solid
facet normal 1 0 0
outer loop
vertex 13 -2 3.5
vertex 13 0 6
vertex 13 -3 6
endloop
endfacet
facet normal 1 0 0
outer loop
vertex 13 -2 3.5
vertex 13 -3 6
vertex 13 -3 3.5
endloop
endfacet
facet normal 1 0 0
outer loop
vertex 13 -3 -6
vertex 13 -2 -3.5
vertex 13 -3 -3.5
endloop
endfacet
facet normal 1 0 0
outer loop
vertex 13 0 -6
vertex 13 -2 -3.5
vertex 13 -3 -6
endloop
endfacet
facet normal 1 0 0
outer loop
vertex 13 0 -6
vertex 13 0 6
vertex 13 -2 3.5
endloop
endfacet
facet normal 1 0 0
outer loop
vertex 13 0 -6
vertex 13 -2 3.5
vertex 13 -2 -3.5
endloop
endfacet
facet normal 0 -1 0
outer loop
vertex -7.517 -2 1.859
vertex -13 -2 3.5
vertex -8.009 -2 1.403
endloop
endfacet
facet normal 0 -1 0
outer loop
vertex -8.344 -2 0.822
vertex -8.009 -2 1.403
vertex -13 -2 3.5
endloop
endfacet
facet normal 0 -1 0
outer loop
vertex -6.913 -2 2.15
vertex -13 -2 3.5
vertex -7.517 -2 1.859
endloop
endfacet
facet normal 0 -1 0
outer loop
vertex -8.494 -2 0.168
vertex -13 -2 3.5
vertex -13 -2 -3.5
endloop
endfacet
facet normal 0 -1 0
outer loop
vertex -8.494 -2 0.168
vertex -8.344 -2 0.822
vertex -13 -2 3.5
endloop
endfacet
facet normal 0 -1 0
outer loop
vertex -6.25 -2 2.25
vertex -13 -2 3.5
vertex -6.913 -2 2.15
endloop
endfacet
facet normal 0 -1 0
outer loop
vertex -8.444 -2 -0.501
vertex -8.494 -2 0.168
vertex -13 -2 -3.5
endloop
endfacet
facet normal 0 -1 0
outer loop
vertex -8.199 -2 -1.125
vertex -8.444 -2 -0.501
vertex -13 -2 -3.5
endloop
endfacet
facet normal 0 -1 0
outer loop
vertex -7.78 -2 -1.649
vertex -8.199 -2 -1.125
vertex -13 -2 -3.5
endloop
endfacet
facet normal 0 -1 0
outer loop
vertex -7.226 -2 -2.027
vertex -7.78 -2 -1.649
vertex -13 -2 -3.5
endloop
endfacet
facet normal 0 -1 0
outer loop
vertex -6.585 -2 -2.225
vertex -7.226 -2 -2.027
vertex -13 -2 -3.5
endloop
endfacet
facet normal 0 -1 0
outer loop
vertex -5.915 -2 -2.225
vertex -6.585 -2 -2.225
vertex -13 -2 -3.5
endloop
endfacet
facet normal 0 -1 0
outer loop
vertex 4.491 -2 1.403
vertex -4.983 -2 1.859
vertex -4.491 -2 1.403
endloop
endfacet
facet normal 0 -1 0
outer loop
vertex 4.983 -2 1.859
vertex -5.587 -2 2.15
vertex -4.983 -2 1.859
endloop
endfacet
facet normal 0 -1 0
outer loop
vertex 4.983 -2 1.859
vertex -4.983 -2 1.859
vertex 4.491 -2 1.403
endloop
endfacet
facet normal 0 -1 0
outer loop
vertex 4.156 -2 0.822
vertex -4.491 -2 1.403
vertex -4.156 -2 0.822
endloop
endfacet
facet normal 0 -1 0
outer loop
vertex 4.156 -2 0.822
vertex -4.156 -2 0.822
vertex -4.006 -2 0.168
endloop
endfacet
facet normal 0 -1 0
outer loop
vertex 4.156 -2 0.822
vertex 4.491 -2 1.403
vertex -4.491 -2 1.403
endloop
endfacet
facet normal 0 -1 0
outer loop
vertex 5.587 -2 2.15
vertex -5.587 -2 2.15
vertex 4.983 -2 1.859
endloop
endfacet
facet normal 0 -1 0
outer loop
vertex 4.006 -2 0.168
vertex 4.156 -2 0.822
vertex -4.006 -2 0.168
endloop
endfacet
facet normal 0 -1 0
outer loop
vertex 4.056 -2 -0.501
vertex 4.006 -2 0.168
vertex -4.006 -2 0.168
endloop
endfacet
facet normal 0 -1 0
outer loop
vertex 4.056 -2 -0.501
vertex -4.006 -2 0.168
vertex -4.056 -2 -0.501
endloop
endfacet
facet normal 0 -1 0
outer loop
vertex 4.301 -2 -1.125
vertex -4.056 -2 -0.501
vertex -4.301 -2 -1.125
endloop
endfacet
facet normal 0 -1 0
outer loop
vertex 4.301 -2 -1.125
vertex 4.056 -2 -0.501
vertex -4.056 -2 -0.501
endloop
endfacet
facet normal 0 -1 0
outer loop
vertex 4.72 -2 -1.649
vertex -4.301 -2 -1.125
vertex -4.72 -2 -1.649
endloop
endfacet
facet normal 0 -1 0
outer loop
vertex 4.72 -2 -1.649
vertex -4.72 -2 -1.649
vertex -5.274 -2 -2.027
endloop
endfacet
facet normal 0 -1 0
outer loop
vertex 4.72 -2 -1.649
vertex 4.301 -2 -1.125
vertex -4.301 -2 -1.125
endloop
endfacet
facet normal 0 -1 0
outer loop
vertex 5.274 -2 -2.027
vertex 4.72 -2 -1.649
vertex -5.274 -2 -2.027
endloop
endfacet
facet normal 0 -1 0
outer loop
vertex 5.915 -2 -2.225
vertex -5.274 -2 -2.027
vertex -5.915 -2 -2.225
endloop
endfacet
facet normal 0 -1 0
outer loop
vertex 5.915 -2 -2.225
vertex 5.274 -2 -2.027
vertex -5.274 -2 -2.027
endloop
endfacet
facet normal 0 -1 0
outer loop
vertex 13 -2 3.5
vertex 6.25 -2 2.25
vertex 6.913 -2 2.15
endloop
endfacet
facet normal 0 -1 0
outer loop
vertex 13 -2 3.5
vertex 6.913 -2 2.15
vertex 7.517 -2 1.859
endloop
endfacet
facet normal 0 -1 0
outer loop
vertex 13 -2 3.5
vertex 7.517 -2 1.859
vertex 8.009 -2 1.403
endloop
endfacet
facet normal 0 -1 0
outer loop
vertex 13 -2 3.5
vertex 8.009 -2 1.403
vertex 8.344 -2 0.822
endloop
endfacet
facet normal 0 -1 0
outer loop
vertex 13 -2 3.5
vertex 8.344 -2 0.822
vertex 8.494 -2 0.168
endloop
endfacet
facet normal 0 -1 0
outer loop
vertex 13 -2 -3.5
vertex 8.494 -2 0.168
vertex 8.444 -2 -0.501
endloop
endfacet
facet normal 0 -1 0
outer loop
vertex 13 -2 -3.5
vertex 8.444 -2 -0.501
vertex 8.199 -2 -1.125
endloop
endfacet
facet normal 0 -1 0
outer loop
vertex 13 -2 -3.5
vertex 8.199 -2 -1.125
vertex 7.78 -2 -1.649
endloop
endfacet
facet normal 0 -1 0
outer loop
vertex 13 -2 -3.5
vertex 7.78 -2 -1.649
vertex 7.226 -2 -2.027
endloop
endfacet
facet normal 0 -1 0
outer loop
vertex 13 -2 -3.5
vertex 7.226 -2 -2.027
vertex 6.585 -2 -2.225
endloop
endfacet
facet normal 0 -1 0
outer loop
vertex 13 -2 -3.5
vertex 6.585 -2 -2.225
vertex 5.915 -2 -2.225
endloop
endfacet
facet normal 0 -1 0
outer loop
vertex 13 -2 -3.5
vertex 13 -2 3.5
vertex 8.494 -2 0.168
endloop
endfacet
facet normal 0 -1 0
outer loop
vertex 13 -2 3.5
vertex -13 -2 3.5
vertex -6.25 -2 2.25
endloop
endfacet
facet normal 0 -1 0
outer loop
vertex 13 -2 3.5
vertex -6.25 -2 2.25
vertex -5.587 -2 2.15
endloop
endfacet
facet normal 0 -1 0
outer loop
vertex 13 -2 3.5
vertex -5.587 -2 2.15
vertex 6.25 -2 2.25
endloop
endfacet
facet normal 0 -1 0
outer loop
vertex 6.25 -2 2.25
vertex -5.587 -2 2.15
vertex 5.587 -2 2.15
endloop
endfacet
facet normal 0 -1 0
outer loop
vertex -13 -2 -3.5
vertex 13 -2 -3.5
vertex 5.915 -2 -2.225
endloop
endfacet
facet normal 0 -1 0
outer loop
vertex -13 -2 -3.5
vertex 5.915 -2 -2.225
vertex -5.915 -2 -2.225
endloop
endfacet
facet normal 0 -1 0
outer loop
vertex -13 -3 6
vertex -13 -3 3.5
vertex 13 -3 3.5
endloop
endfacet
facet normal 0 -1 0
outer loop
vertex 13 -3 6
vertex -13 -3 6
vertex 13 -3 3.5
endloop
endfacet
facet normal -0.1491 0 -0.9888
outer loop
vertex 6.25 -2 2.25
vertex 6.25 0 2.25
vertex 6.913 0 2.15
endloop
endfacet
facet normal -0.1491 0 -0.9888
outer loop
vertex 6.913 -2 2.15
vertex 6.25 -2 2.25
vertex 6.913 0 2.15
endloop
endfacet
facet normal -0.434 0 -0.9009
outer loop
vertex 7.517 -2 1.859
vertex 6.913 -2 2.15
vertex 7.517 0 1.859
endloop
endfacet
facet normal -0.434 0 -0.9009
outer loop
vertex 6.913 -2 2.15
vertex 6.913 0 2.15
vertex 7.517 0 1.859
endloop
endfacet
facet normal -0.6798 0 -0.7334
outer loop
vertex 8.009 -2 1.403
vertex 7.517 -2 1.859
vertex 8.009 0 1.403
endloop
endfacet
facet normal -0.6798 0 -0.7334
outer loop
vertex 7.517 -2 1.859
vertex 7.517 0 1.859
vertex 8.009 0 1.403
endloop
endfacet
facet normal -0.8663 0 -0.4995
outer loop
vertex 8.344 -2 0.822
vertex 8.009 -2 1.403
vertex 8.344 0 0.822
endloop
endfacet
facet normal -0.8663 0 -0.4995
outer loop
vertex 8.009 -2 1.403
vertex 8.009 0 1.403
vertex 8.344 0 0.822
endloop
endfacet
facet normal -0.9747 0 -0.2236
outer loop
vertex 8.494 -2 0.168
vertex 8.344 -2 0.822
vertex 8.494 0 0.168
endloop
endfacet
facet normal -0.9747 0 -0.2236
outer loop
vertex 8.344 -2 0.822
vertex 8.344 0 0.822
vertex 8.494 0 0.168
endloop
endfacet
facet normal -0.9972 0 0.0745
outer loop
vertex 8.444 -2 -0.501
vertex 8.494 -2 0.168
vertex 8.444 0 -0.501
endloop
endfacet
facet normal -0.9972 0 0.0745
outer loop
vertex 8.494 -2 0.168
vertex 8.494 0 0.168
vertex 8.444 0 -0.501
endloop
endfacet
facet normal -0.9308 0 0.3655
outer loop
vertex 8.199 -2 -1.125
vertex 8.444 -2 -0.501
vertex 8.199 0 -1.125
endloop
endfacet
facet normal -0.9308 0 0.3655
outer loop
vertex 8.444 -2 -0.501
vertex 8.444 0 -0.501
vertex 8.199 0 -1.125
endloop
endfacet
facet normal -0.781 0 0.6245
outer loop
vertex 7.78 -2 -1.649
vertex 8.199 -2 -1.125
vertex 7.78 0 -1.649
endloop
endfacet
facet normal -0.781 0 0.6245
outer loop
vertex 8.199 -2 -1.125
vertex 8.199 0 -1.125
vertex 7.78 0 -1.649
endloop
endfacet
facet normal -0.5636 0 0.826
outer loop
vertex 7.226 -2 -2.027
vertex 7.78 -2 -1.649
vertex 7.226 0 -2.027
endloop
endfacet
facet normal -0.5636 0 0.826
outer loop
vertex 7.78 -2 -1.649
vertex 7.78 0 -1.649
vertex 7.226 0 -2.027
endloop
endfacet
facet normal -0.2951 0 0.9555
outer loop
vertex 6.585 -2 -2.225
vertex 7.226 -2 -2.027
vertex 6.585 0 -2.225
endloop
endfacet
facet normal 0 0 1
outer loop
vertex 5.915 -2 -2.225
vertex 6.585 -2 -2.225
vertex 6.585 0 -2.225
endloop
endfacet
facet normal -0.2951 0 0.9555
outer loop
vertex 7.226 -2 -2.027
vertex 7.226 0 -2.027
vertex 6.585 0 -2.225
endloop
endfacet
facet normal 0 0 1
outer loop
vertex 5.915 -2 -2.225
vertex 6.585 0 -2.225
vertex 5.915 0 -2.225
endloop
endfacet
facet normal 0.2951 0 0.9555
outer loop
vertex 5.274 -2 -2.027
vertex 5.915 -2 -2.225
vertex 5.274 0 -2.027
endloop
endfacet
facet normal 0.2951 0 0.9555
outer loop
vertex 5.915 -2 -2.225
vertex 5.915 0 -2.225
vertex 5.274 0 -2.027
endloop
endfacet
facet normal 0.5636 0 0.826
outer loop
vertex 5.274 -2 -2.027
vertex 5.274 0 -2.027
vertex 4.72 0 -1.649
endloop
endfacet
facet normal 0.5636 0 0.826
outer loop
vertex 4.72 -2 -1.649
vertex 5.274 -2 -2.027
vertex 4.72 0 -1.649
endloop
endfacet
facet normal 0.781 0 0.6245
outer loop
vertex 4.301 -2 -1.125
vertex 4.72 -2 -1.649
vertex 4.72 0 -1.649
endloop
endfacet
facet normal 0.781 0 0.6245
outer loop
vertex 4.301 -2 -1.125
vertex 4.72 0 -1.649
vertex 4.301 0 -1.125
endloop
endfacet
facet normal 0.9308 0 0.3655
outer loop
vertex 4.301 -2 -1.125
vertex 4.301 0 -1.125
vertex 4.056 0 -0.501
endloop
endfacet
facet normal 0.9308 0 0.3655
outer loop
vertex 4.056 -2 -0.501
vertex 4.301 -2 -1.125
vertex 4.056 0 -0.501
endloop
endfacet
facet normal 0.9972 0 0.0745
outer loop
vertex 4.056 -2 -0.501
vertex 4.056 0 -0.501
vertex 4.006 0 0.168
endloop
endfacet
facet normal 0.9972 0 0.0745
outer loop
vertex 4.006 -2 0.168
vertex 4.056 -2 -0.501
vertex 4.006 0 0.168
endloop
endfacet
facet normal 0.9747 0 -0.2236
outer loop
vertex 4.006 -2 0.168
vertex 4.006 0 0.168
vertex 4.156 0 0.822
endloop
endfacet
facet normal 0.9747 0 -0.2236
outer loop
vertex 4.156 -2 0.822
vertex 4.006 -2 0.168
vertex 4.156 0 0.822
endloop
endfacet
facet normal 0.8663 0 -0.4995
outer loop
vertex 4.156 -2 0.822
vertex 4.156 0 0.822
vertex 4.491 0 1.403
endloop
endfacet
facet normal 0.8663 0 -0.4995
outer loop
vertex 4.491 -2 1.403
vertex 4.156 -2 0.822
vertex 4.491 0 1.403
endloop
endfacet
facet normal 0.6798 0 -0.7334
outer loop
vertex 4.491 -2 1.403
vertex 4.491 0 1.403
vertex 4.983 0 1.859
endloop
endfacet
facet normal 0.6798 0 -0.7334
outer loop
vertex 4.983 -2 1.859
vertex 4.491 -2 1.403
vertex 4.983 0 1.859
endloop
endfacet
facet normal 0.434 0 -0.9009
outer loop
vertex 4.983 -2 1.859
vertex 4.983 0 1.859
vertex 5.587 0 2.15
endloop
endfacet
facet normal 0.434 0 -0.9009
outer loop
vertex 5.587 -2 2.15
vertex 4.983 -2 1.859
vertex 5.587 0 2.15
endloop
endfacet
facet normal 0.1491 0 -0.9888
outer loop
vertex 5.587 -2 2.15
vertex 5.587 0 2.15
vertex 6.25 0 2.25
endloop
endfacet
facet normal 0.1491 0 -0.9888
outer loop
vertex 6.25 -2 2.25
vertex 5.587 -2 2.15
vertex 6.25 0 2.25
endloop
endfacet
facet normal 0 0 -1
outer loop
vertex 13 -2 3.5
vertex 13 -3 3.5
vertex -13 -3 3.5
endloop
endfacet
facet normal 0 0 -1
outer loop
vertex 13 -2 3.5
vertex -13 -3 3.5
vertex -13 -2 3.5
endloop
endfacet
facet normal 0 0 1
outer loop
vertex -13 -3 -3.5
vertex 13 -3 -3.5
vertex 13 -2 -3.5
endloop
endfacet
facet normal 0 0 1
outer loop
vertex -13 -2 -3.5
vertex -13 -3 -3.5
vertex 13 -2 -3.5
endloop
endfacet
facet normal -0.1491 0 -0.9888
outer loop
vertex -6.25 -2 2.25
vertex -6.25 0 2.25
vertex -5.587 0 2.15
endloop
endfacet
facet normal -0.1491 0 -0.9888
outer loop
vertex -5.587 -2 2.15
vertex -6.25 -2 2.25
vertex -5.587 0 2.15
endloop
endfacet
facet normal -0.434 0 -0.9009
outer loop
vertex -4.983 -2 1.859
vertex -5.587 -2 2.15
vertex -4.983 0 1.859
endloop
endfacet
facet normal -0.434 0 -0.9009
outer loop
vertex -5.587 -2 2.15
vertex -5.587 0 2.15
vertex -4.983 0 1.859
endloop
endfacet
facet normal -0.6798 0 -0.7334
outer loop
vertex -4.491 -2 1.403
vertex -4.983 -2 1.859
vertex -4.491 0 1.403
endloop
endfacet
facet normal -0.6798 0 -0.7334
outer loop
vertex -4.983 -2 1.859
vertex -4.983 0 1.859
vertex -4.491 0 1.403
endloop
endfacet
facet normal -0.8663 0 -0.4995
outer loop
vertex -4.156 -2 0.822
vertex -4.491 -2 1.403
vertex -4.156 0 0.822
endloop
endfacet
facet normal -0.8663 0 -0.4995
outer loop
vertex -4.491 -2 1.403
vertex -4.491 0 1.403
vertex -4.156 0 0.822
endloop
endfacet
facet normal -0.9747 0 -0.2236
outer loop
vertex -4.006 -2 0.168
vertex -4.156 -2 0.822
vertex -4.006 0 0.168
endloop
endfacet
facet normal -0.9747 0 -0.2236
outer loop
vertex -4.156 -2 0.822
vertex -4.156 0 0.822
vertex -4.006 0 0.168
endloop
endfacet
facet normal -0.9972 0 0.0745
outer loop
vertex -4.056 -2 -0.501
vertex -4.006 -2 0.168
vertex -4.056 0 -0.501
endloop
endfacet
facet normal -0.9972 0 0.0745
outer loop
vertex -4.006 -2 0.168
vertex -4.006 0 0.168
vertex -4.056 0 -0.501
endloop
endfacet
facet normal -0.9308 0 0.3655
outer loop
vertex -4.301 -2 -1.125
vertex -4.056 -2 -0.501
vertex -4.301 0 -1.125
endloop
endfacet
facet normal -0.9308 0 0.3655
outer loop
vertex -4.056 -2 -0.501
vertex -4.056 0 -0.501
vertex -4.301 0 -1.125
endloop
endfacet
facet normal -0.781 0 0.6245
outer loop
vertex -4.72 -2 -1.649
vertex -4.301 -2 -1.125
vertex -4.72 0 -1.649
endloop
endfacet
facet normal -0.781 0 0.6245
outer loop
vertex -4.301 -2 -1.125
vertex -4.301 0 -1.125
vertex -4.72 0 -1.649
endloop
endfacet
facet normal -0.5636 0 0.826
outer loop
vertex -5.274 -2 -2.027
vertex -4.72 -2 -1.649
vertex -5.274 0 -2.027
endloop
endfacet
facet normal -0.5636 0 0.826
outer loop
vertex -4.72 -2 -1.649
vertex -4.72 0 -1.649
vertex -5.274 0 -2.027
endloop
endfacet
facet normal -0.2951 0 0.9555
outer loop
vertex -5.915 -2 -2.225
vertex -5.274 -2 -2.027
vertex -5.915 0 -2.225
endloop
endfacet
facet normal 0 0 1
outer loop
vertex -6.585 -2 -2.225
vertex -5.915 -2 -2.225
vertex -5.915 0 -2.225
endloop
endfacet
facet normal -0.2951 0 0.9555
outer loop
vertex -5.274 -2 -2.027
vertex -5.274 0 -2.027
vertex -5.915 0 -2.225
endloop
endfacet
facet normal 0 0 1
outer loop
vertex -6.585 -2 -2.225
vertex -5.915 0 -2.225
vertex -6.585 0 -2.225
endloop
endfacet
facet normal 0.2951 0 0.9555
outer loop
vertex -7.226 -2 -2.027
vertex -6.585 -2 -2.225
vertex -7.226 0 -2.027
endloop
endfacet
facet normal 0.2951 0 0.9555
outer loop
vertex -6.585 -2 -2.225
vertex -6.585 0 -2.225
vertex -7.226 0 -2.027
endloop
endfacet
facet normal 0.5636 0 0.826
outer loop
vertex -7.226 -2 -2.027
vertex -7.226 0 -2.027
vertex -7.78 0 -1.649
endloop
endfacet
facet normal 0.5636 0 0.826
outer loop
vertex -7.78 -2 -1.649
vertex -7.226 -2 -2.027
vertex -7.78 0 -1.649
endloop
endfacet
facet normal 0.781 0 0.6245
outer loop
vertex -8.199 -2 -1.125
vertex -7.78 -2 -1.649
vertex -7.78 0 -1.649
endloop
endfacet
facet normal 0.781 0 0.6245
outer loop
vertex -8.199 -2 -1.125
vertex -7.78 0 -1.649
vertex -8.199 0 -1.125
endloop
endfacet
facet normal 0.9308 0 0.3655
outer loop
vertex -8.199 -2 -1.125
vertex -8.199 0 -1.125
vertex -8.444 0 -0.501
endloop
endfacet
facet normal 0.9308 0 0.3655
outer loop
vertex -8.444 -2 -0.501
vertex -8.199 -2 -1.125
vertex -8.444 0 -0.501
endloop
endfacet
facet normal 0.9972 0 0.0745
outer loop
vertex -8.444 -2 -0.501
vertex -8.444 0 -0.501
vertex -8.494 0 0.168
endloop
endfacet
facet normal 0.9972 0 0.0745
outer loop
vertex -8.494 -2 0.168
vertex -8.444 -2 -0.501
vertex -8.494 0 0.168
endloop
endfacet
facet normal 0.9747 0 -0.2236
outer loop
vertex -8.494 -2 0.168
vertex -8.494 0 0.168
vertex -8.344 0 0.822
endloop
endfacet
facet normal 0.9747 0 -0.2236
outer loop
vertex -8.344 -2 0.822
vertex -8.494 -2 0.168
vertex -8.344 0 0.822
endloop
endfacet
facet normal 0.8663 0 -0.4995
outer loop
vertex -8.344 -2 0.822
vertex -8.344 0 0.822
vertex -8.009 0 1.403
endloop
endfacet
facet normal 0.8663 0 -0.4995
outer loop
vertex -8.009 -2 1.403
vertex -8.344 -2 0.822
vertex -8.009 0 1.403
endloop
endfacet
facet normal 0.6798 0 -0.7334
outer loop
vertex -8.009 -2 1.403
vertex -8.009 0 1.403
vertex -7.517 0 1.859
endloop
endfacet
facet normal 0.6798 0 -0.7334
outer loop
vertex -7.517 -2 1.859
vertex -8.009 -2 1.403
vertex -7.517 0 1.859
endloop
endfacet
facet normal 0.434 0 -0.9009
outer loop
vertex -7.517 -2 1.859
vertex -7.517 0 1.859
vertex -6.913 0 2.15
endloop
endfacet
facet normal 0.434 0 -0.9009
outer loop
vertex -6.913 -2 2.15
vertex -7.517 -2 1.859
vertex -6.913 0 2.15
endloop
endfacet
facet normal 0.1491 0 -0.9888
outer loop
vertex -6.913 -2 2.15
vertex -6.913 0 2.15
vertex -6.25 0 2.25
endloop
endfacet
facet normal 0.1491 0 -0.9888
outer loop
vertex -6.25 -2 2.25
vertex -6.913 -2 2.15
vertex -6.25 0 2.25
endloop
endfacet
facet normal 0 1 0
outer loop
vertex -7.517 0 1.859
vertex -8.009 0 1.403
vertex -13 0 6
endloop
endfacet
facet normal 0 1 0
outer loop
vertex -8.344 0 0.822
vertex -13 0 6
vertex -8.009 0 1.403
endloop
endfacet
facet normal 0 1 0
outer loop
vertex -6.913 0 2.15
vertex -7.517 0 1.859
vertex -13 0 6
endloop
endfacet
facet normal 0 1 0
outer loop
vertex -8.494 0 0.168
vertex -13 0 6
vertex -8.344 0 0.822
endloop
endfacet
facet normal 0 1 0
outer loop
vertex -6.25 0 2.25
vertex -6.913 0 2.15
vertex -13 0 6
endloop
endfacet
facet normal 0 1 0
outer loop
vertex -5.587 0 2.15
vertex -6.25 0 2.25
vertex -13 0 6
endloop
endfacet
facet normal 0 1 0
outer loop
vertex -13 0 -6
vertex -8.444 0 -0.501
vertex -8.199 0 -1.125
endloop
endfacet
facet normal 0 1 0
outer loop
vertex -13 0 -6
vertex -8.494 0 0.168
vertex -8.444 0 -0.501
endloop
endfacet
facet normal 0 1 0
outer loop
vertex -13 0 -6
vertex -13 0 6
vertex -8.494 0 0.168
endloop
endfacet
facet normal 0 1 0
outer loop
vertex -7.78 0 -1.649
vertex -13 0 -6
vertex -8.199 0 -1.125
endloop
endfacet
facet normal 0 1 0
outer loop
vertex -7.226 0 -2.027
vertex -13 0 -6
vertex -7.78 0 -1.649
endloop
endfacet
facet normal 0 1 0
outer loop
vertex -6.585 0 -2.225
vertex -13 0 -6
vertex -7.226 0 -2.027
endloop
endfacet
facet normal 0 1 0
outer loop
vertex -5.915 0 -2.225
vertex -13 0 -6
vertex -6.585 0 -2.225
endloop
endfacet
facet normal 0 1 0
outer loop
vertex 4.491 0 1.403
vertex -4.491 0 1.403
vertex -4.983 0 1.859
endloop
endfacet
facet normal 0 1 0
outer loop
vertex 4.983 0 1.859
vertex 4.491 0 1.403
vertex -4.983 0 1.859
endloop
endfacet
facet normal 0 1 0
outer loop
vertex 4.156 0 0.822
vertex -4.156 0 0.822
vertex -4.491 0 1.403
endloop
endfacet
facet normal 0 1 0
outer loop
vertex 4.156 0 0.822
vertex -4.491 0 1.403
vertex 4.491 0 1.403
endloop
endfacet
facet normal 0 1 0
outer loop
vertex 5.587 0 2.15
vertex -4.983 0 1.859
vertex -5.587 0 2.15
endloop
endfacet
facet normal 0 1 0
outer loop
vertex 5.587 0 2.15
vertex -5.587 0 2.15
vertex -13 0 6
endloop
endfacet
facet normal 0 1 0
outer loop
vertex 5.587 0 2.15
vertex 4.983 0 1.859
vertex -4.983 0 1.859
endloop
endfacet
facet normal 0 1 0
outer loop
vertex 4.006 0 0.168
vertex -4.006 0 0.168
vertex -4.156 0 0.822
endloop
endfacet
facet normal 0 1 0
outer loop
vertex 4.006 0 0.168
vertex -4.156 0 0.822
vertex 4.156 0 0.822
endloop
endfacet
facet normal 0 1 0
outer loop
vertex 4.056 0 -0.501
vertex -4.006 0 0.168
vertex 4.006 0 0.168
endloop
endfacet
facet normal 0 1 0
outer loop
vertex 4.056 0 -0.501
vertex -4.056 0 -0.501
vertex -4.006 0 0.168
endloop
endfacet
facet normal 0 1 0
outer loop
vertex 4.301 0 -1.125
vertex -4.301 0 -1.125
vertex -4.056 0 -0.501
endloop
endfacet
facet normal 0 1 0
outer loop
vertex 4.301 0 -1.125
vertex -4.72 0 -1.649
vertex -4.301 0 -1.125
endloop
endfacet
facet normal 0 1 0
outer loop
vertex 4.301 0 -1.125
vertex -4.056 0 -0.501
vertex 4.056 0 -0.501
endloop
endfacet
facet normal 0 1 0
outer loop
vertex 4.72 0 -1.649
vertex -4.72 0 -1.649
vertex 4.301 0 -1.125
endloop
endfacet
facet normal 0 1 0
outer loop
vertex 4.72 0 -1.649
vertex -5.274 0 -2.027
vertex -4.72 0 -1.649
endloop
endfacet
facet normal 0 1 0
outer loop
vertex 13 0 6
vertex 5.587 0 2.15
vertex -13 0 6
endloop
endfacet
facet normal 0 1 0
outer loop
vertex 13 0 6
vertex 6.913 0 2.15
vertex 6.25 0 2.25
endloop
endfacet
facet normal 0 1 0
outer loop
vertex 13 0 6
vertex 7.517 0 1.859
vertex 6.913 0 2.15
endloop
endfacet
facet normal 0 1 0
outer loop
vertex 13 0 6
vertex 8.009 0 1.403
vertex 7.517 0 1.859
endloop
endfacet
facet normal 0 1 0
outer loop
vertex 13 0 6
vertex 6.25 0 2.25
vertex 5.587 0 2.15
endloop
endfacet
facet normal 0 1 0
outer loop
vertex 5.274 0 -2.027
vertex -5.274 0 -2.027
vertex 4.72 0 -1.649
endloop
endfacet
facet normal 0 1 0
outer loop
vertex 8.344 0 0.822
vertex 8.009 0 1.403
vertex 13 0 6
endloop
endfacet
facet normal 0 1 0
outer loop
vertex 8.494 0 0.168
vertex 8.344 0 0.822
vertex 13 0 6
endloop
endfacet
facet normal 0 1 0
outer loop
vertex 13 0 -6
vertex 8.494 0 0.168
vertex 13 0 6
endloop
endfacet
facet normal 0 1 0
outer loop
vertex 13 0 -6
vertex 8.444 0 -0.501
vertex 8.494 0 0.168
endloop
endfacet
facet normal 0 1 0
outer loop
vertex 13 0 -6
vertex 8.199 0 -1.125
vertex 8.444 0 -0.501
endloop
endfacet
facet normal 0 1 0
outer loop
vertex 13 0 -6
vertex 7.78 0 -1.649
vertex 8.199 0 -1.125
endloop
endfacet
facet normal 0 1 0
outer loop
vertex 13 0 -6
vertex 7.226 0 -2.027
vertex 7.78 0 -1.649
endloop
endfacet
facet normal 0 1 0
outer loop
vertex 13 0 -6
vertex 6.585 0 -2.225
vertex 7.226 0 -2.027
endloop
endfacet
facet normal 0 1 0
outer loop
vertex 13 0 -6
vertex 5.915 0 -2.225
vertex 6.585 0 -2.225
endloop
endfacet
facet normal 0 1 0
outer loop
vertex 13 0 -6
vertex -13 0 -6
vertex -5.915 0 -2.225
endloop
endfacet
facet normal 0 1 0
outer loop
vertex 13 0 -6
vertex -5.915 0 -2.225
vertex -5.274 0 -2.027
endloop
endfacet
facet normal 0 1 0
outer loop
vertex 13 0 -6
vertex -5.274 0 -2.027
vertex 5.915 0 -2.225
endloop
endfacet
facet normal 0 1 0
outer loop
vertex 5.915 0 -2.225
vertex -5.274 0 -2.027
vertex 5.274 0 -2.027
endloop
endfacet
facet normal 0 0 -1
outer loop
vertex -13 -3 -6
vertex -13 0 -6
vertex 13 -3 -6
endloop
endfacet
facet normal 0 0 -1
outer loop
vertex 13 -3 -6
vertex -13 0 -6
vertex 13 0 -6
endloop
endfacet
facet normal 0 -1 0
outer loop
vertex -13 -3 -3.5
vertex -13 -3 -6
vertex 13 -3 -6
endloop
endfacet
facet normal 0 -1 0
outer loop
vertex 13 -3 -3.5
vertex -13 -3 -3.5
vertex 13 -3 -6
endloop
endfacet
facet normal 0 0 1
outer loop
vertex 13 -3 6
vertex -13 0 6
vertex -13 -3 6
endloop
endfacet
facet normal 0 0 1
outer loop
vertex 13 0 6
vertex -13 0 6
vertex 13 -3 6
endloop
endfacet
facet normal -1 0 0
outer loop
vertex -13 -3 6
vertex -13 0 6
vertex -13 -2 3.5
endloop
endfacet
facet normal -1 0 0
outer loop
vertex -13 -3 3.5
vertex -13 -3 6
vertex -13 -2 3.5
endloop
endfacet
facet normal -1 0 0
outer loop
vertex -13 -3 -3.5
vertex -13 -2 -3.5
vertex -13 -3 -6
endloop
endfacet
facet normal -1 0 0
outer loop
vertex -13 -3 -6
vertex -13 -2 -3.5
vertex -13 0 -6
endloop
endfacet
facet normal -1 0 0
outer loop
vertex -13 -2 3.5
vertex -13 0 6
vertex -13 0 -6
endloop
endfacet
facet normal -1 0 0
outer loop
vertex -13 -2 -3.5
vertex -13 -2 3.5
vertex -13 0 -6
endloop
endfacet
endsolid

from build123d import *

# Parameters (mm, degrees)
SKETCH1_W      = 26
SKETCH1_H      = 12
EXTRUDE1_DEPTH = 3
SKETCH2_R      = 2.25
EXTRUDE2_DEPTH = 4
SKETCH3_W      = 7
SKETCH3_H      = 1
EXTRUDE3_DEPTH = 27


with BuildPart() as part:
    # Sketch1 → Extrude1 (new body)
    with BuildSketch(Plane(origin=(0, 0, 0), x_dir=(1, 0, 0), z_dir=(0, 1, 0))):
        Rectangle(SKETCH1_W, SKETCH1_H)
    extrude(amount=-EXTRUDE1_DEPTH)

    # Sketch2 → Extrude2 (cut, through all)
    with BuildSketch(Plane(origin=(0, 0, 0), x_dir=(1, 0, 0), z_dir=(0, 1, 0))):
        with Locations(Location((-6.25, 0, 0), (0, 0, 270))):  # turned: the seam where the file's is
            Circle(SKETCH2_R)
        with Locations(Location((6.25, 0, 0), (0, 0, 270))):  # turned: the seam where the file's is
            Circle(SKETCH2_R)
    extrude(amount=-EXTRUDE2_DEPTH, mode=Mode.SUBTRACT)

    # Sketch3 → Extrude3 (cut, through all)
    with BuildSketch(Plane(origin=(13, 0, 0), x_dir=(0, 0, -1), z_dir=(1, 0, 0))):
        with Locations((0, -2.5)):
            Rectangle(SKETCH3_W, SKETCH3_H)
    extrude(amount=-EXTRUDE3_DEPTH, mode=Mode.SUBTRACT)


solid = part.part
